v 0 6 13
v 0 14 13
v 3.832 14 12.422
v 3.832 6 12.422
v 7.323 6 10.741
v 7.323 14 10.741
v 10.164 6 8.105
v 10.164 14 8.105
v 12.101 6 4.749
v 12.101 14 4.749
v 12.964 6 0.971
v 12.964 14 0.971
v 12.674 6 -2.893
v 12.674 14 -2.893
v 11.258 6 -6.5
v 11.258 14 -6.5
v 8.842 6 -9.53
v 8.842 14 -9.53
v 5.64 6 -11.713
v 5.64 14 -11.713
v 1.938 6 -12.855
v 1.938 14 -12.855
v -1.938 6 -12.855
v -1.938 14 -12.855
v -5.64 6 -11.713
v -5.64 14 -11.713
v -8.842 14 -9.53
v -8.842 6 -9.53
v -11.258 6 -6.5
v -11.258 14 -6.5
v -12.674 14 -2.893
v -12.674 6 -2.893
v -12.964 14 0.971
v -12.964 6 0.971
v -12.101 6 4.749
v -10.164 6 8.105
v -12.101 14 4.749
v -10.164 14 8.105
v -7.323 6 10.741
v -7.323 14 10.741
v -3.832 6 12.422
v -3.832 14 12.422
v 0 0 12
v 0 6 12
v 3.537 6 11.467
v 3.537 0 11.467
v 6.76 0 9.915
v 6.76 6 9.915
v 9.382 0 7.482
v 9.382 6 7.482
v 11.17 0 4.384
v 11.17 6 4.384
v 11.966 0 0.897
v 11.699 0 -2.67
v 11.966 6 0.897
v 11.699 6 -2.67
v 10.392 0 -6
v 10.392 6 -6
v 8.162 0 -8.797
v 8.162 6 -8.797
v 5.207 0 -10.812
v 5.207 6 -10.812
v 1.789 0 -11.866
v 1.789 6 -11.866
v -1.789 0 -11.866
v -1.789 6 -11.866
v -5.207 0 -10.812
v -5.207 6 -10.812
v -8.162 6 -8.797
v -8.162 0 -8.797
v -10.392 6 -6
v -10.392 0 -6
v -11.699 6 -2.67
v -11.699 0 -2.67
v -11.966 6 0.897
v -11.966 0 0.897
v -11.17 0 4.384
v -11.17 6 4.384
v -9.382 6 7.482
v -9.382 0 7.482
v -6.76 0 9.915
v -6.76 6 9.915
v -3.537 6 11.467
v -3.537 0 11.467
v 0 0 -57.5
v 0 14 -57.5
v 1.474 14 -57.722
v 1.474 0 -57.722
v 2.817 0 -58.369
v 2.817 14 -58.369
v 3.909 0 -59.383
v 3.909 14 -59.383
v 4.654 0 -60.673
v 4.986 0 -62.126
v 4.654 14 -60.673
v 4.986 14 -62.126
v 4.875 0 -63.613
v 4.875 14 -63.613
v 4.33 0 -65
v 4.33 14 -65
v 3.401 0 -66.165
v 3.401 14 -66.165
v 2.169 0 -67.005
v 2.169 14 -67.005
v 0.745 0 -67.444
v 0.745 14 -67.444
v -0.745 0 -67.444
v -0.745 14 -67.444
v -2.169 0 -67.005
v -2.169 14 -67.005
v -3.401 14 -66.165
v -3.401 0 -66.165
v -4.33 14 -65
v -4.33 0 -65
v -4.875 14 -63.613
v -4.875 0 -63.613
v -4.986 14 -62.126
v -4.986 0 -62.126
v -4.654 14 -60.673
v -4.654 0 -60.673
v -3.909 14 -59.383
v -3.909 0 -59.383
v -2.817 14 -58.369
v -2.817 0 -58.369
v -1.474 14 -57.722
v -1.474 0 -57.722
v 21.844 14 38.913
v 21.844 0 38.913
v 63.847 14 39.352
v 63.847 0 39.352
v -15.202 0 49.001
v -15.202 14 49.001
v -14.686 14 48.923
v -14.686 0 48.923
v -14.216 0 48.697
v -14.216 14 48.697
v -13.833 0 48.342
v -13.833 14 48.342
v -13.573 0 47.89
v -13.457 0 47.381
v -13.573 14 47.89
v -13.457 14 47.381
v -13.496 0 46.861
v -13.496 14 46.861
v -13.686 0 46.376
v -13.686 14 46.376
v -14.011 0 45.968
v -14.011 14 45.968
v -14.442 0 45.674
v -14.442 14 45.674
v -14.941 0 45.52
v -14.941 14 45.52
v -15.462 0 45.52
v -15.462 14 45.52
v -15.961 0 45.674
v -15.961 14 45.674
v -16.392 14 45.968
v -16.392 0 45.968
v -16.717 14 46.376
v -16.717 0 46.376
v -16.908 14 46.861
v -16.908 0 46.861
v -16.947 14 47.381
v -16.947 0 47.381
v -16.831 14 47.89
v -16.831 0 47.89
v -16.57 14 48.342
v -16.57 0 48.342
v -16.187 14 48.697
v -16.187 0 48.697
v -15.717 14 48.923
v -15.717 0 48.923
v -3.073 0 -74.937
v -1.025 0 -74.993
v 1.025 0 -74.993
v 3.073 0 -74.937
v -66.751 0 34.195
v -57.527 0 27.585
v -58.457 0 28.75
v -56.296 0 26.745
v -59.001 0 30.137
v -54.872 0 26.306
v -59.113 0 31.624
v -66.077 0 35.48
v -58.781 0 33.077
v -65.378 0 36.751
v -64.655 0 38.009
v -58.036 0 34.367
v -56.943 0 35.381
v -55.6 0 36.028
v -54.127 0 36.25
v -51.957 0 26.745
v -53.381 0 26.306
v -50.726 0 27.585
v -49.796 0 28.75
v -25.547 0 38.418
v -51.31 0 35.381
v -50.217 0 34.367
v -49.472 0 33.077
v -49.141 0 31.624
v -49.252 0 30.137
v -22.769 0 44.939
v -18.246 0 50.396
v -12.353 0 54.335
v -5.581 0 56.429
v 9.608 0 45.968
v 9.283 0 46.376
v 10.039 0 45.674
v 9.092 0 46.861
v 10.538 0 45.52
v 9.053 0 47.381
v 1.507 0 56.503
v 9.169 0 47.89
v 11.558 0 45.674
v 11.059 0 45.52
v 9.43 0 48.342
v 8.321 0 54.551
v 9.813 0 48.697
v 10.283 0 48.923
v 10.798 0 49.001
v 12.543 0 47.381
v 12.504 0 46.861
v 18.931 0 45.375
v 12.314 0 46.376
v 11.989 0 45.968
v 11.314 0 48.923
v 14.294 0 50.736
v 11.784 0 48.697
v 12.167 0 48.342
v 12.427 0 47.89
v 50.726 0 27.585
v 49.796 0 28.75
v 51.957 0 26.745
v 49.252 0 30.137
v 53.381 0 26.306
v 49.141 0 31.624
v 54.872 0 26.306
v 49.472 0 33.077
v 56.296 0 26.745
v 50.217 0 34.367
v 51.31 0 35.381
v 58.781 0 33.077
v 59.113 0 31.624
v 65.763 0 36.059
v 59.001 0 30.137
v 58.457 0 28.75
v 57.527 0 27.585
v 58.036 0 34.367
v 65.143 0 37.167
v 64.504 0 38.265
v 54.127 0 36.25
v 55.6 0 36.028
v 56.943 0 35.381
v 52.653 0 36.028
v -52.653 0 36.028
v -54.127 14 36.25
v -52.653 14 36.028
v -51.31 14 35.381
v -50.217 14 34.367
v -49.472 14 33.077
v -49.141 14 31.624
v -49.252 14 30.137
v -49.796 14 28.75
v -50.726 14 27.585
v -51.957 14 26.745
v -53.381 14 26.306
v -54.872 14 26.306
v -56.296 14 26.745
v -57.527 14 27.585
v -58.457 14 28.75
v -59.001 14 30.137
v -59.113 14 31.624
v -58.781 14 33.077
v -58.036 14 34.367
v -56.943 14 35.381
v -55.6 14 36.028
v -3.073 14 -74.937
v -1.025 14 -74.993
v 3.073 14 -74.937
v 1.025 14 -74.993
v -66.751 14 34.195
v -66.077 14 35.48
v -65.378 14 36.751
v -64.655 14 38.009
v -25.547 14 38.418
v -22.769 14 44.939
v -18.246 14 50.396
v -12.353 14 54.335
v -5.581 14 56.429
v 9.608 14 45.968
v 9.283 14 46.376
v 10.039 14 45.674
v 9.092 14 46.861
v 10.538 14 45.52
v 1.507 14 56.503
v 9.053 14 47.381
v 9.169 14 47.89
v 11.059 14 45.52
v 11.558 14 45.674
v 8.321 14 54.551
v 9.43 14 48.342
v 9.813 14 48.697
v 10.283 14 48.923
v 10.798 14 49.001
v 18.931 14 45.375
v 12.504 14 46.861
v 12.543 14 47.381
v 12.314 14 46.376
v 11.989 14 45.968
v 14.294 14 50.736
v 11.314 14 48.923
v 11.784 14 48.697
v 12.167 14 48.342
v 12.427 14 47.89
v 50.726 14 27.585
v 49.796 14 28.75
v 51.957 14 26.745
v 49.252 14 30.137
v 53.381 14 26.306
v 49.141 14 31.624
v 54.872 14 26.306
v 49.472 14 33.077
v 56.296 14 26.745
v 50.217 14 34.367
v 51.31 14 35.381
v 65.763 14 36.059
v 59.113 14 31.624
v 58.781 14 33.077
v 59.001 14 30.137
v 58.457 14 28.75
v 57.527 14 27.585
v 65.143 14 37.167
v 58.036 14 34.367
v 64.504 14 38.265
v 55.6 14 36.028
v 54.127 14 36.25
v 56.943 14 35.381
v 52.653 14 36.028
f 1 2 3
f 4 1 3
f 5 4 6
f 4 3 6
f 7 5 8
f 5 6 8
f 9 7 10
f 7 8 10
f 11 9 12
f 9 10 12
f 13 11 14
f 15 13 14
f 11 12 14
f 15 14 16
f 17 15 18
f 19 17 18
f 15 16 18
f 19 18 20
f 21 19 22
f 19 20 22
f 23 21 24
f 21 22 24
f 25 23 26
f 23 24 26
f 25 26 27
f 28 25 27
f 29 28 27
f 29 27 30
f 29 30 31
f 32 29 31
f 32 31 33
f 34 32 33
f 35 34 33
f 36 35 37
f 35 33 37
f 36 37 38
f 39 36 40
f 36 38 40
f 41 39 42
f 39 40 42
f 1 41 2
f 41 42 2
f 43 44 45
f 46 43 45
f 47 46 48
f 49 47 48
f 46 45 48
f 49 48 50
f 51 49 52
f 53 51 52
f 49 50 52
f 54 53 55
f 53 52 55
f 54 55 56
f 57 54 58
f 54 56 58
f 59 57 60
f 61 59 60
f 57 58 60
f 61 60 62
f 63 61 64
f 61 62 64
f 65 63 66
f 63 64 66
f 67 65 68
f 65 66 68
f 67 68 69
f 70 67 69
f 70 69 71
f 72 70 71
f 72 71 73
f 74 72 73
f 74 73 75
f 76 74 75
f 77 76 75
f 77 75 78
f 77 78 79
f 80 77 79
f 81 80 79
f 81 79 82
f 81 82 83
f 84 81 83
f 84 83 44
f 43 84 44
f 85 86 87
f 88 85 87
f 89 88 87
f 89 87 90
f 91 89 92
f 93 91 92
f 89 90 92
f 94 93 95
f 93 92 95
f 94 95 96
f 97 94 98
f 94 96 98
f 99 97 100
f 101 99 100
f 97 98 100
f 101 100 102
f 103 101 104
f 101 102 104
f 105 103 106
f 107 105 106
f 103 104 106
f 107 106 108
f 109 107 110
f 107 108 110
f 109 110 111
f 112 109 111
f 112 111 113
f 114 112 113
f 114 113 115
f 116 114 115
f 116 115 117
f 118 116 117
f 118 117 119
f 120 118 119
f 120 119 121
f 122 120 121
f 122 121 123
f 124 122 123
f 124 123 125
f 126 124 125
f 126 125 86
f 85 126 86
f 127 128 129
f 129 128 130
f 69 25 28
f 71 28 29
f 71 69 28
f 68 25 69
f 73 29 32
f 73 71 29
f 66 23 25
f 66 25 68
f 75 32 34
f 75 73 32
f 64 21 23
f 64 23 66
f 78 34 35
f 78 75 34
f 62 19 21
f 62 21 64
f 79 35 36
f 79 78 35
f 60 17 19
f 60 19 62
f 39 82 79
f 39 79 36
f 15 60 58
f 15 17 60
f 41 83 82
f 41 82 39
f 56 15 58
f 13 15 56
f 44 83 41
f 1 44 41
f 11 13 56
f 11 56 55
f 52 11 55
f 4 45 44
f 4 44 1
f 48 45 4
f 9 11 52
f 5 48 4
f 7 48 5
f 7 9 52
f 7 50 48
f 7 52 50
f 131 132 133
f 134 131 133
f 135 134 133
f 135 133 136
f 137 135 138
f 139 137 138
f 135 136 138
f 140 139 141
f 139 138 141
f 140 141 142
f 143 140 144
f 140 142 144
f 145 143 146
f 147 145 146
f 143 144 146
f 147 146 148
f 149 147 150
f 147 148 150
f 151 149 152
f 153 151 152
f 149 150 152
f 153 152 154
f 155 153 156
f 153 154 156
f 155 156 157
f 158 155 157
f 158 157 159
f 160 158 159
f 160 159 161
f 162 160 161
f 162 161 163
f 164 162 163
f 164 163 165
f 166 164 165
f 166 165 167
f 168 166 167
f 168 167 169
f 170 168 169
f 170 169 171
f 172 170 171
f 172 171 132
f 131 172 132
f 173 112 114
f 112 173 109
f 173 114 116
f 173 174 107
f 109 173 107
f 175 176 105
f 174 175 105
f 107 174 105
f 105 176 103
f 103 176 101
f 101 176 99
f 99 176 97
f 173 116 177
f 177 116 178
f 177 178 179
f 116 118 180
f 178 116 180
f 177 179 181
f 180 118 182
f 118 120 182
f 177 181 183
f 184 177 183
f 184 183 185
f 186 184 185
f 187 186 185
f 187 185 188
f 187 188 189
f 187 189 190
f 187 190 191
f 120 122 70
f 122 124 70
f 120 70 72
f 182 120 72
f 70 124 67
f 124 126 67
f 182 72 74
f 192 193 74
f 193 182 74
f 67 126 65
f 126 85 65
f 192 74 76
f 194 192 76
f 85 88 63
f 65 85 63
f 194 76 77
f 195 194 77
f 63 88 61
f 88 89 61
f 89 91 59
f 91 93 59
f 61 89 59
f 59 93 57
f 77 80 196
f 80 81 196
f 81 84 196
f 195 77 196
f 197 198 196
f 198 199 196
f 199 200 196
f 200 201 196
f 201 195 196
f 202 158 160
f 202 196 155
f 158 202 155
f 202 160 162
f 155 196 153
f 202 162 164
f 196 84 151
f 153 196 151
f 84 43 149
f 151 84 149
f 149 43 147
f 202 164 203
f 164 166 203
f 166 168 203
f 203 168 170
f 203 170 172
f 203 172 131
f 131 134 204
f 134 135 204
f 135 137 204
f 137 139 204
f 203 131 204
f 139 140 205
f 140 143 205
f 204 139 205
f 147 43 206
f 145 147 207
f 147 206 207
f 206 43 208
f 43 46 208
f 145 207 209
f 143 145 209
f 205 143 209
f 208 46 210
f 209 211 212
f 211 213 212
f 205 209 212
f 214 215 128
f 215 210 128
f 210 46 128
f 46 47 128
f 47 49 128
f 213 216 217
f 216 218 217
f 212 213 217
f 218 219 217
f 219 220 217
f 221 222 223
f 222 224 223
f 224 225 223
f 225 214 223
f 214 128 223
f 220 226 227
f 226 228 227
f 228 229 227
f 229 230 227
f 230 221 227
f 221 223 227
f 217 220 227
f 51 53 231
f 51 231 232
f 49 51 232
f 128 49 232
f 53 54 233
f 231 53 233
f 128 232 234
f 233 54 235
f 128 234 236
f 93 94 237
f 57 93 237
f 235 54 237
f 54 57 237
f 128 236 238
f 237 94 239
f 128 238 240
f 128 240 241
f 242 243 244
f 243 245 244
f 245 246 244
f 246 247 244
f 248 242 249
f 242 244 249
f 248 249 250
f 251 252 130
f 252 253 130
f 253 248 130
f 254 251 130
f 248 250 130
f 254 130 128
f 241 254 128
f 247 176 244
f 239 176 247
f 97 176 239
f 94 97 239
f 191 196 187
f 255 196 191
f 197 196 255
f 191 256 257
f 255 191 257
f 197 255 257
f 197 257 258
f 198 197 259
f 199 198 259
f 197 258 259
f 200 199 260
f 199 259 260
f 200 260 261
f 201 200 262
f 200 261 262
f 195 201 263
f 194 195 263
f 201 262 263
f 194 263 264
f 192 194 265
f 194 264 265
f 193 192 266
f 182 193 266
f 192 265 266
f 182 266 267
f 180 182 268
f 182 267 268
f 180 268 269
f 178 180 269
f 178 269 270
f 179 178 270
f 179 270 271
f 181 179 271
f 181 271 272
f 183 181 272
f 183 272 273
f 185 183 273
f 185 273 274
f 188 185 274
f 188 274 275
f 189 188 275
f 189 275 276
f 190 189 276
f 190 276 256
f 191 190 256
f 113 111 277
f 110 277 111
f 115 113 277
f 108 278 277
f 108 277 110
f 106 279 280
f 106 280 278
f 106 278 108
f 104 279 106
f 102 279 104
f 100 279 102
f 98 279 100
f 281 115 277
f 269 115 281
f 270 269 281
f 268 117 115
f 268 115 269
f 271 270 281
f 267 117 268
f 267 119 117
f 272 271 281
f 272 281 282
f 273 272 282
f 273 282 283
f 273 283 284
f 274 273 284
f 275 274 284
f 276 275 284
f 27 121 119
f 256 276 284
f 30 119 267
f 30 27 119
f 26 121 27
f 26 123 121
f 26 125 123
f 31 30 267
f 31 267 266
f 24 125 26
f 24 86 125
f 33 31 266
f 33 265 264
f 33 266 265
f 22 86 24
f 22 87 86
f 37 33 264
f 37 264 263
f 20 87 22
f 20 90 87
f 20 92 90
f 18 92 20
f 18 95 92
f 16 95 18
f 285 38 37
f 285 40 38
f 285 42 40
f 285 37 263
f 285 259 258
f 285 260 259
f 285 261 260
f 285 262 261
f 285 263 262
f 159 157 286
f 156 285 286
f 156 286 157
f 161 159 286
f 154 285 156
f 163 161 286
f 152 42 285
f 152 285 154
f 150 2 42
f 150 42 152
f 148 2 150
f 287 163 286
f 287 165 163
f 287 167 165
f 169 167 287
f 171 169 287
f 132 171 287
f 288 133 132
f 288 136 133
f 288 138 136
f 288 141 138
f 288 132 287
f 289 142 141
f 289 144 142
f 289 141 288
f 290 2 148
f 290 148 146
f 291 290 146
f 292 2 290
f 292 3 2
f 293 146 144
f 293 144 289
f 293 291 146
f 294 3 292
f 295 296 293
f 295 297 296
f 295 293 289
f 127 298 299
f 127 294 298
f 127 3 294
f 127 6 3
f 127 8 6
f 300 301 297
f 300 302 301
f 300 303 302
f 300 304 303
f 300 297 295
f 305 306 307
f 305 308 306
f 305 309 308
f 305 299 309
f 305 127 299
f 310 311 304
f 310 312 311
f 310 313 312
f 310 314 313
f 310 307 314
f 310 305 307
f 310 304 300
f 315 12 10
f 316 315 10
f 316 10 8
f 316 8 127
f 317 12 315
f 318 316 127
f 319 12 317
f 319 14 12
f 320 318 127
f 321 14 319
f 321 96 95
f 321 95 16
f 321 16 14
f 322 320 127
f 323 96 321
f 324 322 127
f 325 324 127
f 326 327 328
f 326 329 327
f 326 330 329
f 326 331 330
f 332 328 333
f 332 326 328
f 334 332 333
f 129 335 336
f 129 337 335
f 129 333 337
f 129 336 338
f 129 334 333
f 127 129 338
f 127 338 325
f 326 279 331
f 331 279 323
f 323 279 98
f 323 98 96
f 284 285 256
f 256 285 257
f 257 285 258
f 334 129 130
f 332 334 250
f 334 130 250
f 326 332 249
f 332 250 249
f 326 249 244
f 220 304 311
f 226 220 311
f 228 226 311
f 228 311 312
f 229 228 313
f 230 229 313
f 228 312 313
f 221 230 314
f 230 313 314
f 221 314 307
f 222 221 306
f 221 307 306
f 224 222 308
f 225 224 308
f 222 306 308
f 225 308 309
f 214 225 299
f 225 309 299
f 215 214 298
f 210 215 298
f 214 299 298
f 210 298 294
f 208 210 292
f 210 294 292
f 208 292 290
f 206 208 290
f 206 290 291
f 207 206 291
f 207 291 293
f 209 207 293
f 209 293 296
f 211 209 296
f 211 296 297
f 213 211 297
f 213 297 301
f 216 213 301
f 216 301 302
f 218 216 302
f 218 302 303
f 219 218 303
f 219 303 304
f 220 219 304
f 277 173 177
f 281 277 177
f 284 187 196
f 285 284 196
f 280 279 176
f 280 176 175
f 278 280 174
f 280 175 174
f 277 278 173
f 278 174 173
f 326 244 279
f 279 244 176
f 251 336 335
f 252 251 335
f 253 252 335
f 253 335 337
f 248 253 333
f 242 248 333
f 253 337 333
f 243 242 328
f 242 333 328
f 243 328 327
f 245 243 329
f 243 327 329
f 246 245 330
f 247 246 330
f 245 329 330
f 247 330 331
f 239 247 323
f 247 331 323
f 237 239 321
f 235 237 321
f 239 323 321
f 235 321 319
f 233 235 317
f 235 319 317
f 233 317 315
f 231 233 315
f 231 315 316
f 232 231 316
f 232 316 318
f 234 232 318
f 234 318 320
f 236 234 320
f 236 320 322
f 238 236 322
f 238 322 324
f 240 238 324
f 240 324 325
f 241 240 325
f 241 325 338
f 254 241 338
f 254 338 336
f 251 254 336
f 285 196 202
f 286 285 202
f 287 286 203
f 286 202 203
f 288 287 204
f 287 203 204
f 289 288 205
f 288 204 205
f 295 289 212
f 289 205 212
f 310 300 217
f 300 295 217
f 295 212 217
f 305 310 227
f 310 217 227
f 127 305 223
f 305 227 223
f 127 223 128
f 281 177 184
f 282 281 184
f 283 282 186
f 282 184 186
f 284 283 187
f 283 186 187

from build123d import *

# Parameters (mm, degrees)
SKETCH1_R           = 75
BOSS_EXTRUDE1_DEPTH = 14
SKETCH2_R           = 13
CUT_EXTRUDE1_DEPTH  = 8
SKETCH3_R           = 12
CUT_EXTRUDE2_DEPTH  = 8
SKETCH4_R           = 5
CUT_EXTRUDE4_DEPTH  = 107.98598039
SKETCH5_R           = 1.75
CUT_EXTRUDE5_DEPTH  = 107.98598039
CUT_EXTRUDE6_DEPTH  = 15


with BuildPart() as part:
    # Sketch1 → Boss-Extrude1 (new body)
    with BuildSketch(Plane(origin=(0, 0, 0), x_dir=(1, 0, 0), z_dir=(0, 1, 0))):
        with Locations(Location((0, 0, 0), (0, 0, 270))):
            Circle(SKETCH1_R)
    extrude(amount=BOSS_EXTRUDE1_DEPTH)

    # Sketch2 → Cut-Extrude1 (cut)
    with BuildSketch(Plane(origin=(0, 14, 0), x_dir=(1, 0, 0), z_dir=(0, 1, 0))):
        with Locations(Location((0, 0, 0), (0, 0, 270))):
            Circle(SKETCH2_R)
    extrude(amount=-CUT_EXTRUDE1_DEPTH, mode=Mode.SUBTRACT)

    # Sketch3 → Cut-Extrude2 (cut)
    with BuildSketch(Plane(origin=(0, 6, 0), x_dir=(1, 0, 0), z_dir=(0, 1, 0))):
        with Locations(Location((0, 0, 0), (0, 0, 270))):
            Circle(SKETCH3_R)
    extrude(amount=-CUT_EXTRUDE2_DEPTH, mode=Mode.SUBTRACT)

    # Sketch4 → Cut-Extrude4 (cut, through all)
    with BuildSketch(Plane(origin=(0, 14, 0), x_dir=(1, 0, 0), z_dir=(0, 1, 0))):
        with Locations(Location((0, 62.5, 0), (0, 0, 270))):
            Circle(SKETCH4_R)
        with Locations(Location((-54.126587737, -31.25, 0), (0, 0, 270))):
            Circle(SKETCH4_R)
        with Locations(Location((54.126587737, -31.25, 0), (0, 0, 270))):
            Circle(SKETCH4_R)
    extrude(amount=-CUT_EXTRUDE4_DEPTH, mode=Mode.SUBTRACT)

    # Sketch5 → Cut-Extrude5 (cut, through all)
    with BuildSketch(Plane(origin=(0, 14, 0), x_dir=(1, 0, 0), z_dir=(0, 1, 0))):
        with Locations(Location((-15.201634245, -47.250661584, 0), (0, 0, 270))):
            Circle(SKETCH5_R)
        with Locations(Location((10.798365755, -47.250661584, 0), (0, 0, 270))):
            Circle(SKETCH5_R)
    extrude(amount=-CUT_EXTRUDE5_DEPTH, mode=Mode.SUBTRACT)

    # Sketch6 → Cut-Extrude6 (cut)
    with BuildSketch(Plane(origin=(0, 0, 0), x_dir=(-1, 0, 0), z_dir=(0, -1, 0))):
        with BuildLine():
            ThreePointArc((75, 0), (54.10858072, 51.935166241), (3.073026868, 74.937016927))
            Line((3.073026868, 74.937016927), (66.751084117, -34.194923151))
            ThreePointArc((66.751084117, -34.194923151), (72.908611661, -17.587903389), (75, 0))
        make_face()
        with BuildLine():
            Line((-65.762802754, -36.059031794), (-3.073026868, 74.937016927))
            ThreePointArc((-3.073026868, 74.937016927), (-65.304085384, 36.883281201), (-65.762802754, -36.059031794))
        make_face()
        with BuildLine():
            ThreePointArc((-63.846861253, -39.351979723), (0.783642911, -74.995905914), (64.655219699, -38.009243162))
            Line((64.655219699, -38.009243162), (25.54691352, -38.417891428))
            ThreePointArc((25.54691352, -38.417891428), (2.039914544, -56.722875597), (-21.844452804, -38.91309057))
            Line((-21.844452804, -38.91309057), (-63.846861253, -39.351979723))
        make_face()
    extrude(amount=-CUT_EXTRUDE6_DEPTH, mode=Mode.SUBTRACT)


solid = part.part
